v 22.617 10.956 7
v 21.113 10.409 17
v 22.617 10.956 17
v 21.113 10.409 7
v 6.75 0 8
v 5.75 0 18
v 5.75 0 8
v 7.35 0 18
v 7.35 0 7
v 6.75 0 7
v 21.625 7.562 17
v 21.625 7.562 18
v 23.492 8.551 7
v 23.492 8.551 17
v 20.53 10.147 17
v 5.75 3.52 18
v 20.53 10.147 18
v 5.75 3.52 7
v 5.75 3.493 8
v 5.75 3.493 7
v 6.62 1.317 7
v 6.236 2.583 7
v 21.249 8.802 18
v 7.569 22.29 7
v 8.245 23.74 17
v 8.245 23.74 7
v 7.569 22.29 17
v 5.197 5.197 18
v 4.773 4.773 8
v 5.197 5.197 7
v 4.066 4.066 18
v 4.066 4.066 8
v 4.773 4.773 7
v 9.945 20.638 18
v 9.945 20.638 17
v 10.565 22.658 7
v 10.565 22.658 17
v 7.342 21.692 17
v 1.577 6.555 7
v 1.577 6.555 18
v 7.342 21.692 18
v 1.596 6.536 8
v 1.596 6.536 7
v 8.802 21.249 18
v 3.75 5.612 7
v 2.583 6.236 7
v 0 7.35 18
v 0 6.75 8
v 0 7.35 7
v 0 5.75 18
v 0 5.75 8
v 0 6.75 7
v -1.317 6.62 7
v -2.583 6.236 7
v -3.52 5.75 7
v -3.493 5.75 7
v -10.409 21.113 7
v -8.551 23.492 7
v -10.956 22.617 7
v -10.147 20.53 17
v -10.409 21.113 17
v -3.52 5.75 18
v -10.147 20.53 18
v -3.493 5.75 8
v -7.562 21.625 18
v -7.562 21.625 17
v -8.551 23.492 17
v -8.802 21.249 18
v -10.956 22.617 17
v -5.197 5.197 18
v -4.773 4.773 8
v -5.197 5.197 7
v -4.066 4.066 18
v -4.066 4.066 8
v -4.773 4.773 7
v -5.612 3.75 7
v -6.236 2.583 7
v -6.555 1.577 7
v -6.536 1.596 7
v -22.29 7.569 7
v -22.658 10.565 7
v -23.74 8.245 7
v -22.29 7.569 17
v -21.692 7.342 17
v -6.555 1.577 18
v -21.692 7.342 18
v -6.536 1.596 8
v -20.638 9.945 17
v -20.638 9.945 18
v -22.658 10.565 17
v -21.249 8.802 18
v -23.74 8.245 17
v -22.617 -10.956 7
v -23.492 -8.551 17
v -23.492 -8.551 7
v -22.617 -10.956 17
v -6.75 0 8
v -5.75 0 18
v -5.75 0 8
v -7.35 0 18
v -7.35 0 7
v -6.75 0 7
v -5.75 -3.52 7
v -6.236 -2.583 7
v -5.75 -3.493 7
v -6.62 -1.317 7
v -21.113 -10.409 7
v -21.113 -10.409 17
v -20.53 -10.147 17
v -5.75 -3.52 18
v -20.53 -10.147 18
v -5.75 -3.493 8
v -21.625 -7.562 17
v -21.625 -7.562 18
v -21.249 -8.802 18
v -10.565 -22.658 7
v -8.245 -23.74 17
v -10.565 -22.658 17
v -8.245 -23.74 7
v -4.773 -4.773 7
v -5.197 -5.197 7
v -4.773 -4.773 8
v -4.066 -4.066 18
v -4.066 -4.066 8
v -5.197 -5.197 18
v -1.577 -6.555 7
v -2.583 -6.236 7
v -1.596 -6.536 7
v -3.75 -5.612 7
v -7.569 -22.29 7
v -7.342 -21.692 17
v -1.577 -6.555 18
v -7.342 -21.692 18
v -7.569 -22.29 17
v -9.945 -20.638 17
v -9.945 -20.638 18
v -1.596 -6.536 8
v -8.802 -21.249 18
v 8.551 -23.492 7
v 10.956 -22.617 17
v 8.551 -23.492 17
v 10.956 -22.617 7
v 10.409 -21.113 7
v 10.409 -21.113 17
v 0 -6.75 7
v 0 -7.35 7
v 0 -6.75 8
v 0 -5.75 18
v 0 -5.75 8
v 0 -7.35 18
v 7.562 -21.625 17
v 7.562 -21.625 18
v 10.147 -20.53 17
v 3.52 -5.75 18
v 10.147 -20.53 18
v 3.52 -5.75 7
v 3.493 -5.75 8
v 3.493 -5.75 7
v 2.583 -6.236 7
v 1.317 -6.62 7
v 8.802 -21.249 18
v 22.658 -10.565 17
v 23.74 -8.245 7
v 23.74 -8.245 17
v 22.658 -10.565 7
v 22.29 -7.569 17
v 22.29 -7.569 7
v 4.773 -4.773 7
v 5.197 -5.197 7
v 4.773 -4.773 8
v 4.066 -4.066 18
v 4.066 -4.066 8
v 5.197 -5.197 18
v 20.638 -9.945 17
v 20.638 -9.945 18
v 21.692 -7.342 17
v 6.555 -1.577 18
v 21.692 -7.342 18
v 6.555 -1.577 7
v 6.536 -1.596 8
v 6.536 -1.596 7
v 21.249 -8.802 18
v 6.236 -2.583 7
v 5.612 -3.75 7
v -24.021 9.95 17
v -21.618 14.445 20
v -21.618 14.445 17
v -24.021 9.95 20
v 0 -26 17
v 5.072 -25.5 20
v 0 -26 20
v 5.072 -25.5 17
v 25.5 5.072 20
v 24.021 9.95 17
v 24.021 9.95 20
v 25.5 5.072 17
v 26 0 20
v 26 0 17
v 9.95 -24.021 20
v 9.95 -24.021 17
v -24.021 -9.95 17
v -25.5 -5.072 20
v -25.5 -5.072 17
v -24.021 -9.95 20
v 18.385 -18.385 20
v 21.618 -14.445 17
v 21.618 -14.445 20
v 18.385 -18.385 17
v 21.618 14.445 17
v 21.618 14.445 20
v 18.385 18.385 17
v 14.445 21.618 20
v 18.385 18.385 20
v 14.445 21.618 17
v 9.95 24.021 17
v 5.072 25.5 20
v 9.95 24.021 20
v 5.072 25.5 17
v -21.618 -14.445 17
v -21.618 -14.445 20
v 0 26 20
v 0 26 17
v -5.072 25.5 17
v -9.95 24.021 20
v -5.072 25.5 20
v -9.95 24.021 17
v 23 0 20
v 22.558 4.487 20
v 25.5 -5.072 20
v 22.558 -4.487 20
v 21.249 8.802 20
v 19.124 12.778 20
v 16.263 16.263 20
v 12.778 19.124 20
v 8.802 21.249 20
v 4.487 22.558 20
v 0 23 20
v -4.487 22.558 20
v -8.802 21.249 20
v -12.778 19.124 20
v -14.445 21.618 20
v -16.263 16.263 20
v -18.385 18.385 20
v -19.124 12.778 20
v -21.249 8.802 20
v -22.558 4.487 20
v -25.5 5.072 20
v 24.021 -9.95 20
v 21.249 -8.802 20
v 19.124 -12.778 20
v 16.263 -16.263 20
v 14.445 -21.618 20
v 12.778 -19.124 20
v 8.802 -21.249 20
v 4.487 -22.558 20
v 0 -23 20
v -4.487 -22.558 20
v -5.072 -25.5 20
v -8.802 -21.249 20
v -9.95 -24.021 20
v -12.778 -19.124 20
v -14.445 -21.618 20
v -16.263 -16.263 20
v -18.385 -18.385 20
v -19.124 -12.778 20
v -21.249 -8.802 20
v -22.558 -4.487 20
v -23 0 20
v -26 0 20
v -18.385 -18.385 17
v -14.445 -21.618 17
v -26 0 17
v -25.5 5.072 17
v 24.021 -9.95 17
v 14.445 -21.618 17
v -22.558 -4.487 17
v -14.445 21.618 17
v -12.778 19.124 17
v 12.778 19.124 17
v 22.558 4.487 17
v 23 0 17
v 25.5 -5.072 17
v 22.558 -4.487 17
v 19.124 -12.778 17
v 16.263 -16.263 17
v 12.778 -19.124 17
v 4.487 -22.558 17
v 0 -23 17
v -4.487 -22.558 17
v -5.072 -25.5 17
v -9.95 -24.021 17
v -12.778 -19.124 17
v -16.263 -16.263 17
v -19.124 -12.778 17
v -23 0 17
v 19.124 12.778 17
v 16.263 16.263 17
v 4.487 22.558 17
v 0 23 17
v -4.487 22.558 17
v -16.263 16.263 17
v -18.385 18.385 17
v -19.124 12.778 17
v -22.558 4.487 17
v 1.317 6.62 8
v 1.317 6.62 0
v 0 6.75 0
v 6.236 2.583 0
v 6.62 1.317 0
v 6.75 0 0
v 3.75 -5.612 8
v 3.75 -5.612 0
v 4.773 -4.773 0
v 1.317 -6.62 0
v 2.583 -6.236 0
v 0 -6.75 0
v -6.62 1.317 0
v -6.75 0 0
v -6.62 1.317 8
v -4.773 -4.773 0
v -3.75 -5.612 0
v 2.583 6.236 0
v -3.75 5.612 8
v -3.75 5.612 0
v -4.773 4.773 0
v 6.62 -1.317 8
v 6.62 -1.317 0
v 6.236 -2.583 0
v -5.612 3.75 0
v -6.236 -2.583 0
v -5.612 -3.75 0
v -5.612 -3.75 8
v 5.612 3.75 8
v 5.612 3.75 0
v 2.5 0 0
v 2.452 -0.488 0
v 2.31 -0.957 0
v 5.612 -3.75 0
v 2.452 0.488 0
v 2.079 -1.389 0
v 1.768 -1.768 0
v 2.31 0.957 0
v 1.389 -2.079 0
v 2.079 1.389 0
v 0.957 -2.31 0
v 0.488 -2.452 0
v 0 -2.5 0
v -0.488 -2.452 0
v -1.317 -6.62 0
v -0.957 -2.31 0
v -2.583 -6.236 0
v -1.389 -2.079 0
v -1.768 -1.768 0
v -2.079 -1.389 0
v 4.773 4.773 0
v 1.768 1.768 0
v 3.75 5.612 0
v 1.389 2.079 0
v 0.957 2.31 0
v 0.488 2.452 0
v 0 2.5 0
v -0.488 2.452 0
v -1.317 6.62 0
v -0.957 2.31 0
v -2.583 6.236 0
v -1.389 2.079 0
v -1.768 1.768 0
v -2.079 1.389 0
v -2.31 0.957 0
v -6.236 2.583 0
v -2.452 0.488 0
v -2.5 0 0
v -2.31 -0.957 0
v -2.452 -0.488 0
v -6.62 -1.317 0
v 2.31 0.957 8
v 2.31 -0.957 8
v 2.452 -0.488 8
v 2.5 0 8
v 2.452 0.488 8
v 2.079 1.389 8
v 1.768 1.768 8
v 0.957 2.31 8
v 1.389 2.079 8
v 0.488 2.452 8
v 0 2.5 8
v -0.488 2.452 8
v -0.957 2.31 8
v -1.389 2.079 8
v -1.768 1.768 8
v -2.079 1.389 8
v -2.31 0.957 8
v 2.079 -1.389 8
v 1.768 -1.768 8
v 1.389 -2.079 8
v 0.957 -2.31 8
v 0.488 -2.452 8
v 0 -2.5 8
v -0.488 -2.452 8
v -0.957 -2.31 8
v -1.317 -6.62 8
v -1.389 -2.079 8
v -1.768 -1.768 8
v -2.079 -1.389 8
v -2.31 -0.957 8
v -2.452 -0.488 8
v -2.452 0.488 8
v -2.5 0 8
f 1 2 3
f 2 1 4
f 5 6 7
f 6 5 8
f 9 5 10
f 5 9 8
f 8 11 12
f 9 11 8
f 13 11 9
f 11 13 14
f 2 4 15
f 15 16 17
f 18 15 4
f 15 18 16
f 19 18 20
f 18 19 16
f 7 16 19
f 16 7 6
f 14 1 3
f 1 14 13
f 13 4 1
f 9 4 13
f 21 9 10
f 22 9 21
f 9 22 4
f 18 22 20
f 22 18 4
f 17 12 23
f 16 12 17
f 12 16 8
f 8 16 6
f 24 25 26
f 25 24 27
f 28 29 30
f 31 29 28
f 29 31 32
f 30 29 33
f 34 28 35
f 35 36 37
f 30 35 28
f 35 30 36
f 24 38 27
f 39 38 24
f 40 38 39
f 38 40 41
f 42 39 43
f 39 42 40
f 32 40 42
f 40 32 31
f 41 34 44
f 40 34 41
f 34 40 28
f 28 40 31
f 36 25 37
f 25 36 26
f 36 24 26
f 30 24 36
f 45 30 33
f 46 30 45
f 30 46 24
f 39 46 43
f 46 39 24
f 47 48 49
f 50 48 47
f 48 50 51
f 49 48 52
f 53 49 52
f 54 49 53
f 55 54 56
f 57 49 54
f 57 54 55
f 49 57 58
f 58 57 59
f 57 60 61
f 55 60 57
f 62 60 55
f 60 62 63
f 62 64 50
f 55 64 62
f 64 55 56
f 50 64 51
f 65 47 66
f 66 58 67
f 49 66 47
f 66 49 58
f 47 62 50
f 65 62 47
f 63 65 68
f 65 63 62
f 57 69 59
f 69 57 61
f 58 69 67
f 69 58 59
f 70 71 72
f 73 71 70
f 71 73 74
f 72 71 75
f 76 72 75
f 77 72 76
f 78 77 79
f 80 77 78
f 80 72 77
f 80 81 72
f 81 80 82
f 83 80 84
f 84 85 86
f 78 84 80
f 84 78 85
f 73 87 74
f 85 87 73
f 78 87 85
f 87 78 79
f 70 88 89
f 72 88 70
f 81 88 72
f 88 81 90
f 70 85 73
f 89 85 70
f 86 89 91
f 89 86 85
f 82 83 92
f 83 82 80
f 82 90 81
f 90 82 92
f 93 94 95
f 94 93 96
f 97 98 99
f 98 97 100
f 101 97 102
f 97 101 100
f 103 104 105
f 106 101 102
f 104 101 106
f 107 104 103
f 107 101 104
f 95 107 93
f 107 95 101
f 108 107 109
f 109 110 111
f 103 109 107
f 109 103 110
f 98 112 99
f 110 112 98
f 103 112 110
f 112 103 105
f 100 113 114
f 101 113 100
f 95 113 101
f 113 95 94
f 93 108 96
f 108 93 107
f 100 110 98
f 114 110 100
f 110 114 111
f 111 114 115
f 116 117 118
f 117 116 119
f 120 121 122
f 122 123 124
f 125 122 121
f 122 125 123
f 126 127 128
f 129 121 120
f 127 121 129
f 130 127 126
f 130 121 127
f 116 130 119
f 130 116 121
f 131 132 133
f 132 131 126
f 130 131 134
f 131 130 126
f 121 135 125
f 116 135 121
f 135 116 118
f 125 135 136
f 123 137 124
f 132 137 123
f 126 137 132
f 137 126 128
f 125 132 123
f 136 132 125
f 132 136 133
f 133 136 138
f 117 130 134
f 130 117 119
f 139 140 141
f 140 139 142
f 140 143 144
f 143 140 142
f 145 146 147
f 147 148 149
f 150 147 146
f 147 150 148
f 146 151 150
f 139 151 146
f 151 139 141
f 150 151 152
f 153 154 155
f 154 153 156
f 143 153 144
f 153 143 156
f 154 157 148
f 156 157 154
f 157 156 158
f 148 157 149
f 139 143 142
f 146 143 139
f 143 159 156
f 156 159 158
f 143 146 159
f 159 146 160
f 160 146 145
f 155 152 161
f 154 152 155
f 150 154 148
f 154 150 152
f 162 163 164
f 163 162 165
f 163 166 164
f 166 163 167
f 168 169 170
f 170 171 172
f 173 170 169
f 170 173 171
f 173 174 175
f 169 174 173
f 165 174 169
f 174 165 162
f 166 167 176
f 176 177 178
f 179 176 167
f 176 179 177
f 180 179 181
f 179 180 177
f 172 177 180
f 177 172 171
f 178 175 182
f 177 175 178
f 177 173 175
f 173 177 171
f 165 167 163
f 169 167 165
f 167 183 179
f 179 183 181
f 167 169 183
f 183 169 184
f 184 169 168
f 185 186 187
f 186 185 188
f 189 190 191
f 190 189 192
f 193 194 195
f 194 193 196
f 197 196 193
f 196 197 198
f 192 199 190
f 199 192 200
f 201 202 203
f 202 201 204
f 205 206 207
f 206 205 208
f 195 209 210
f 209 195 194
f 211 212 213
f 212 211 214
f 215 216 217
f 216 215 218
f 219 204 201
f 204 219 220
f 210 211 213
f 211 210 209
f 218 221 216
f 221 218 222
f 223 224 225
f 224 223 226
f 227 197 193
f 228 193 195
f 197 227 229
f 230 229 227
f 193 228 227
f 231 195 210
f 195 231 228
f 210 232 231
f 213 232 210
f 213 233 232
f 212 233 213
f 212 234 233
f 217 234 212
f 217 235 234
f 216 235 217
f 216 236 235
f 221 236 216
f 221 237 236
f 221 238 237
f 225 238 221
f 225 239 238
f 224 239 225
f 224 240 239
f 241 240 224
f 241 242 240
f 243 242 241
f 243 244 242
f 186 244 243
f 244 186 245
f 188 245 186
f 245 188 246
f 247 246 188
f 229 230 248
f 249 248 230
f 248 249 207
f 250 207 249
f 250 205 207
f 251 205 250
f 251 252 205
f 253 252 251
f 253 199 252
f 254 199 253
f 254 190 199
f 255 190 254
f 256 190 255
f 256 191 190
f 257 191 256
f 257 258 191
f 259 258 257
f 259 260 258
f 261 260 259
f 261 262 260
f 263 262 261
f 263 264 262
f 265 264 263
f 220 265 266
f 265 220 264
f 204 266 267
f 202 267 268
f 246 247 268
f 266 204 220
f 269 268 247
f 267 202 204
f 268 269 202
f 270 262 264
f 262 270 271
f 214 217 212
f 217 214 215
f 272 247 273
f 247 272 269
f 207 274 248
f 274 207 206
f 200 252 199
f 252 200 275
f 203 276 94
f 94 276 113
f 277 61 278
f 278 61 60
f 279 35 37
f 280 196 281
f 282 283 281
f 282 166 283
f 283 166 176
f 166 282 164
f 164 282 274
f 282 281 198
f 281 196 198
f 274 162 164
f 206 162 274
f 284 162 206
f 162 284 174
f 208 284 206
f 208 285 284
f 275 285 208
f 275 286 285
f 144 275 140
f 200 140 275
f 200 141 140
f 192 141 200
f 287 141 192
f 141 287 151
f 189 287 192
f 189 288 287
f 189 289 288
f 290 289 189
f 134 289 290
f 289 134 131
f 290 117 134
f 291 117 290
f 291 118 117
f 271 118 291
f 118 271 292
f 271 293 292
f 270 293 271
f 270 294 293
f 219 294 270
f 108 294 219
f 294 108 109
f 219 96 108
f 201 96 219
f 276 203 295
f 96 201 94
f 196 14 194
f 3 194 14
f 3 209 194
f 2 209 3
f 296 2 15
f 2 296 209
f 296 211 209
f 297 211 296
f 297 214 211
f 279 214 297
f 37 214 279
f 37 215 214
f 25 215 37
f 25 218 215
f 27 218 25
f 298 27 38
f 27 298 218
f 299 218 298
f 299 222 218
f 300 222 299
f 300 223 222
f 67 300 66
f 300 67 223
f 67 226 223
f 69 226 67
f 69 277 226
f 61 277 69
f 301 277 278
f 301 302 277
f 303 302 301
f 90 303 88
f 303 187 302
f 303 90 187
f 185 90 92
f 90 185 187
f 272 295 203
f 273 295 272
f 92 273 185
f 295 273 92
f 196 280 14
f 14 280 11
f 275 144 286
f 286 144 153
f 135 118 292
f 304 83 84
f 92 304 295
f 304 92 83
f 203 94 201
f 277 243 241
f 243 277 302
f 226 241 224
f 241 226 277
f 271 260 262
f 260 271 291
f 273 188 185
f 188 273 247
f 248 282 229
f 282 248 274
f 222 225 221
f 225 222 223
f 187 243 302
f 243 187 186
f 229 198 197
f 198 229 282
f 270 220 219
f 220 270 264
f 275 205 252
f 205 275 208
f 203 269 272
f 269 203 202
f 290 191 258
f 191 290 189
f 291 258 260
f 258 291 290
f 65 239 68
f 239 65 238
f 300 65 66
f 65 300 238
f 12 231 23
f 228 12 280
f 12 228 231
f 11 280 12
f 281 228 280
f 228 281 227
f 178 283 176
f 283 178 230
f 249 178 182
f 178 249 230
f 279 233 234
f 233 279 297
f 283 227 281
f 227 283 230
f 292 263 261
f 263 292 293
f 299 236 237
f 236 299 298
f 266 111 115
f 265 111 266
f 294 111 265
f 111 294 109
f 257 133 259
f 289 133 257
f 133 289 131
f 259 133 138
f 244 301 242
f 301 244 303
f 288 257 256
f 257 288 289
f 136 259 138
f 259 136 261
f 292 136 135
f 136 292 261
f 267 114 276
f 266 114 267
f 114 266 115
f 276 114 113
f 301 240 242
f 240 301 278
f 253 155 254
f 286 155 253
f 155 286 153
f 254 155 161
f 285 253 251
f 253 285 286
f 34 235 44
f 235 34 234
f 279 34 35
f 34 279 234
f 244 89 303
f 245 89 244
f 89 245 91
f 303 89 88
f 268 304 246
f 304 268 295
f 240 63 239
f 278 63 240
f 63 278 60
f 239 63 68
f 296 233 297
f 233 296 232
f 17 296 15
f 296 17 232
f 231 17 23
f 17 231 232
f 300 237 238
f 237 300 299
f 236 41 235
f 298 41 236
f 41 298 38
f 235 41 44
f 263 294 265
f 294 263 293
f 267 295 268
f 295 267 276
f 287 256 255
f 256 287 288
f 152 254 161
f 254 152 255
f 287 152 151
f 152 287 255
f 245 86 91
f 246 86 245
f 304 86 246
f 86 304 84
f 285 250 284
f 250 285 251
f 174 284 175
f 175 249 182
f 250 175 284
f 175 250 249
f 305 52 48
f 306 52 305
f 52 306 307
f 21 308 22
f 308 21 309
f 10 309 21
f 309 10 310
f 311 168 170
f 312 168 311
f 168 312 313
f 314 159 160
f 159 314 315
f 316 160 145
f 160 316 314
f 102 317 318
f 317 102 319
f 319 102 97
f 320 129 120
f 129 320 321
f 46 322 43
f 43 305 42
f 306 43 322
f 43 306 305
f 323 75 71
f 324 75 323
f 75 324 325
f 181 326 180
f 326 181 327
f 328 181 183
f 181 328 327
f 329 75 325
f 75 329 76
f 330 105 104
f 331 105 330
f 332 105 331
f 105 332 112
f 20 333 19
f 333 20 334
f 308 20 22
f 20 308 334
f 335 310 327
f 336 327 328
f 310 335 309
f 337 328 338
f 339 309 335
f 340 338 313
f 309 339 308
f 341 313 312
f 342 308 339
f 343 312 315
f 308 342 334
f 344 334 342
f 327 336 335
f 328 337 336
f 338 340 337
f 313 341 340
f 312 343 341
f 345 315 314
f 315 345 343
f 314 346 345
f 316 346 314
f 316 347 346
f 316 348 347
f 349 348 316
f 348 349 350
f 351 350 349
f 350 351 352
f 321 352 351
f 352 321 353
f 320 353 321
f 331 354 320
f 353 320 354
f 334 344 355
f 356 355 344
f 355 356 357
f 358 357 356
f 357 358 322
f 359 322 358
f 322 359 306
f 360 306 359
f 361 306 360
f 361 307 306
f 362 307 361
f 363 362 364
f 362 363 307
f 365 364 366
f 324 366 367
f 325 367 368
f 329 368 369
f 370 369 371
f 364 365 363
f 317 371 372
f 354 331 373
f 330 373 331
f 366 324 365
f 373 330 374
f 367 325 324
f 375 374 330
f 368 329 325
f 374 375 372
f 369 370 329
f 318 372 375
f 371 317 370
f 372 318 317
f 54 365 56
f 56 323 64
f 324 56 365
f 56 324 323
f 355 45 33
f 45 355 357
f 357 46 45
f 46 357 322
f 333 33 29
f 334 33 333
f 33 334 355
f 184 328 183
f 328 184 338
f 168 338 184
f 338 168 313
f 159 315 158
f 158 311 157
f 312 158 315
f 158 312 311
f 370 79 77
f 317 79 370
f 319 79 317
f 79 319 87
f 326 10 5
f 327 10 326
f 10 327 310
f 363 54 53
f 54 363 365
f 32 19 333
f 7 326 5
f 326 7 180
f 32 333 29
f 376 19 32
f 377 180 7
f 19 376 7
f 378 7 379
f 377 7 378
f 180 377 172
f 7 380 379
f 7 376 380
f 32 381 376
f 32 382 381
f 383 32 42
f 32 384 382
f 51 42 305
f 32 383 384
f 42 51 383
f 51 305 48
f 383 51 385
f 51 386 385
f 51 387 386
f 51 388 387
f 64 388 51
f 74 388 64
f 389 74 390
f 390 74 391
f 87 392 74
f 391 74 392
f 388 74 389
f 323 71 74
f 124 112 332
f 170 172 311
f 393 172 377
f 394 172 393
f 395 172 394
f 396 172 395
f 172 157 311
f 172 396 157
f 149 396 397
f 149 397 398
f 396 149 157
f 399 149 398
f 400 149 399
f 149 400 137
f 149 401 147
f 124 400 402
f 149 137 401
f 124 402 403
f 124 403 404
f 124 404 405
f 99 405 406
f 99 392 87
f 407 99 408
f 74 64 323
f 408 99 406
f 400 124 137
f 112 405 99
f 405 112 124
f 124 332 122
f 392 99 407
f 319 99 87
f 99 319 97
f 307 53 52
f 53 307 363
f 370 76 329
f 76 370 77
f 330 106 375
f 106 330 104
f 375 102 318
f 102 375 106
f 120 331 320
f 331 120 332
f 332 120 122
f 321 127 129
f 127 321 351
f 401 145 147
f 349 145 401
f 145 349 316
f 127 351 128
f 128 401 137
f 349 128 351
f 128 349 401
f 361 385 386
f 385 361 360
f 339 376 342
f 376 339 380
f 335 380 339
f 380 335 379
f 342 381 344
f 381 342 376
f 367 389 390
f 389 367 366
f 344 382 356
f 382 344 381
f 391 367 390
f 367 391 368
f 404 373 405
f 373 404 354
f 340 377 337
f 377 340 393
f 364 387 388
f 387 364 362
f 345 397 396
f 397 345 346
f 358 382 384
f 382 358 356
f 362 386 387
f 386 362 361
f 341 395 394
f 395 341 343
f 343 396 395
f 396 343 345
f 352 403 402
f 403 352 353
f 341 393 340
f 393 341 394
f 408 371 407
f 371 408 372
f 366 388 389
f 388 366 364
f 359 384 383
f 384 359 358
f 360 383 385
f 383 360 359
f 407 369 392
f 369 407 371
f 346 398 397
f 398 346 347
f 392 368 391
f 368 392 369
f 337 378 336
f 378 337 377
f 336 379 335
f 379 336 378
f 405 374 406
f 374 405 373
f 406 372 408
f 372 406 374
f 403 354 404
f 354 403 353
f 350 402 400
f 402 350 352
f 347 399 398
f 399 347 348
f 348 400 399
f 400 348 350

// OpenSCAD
$fn = 32;

// ----------------------------------------------------------------------
// Impeller: 50 mm, 8 blades, 20 mm tall
// ----------------------------------------------------------------------

// --- parameters (mm) ---
center_d = 13.5;          // hub diameter
center_h = 8;             // hub height
wheel_d = 50;             // outer diameter over the blades
blade_count = 8;          // number of blades
blade_t = 1.6;            // blade thickness
blade_h = 10;             // blade height
blade_in_r = 5.75;        // blade root radius
blade_out_r = 23.4;       // blade tip radius
sweep = 20;               // blade sweep, degrees
bore_d = 5;               // shaft bore
shroud_h = 2;             // shroud ring thickness
shroud_d = 52;            // shroud outside diameter

module hub() {
  cylinder(h = center_h, d = center_d);
}

module blade() {
  /* blade swept between two boxes: hull of the root and the tip section */
  hull() {
    translate([blade_in_r, 0, center_h - 1])
      cube([blade_t, blade_t * 2.2, blade_h + 1], center = false);
    rotate([0, 0, sweep])
      translate([blade_out_r, 0, center_h - 1])
        cube([blade_t, blade_t * 1.6, blade_h + 1], center = false);
  }
}

module blades() {
  for (i = [0 : blade_count - 1])
    rotate([0, 0, i * 360 / blade_count]) blade();
}

module shroud() {
  translate([0, 0, center_h + blade_h - 1])
    difference() {
      cylinder(h = shroud_h + 1, d = shroud_d);
      translate([0, 0, -1]) cylinder(h = shroud_h + 3, d = shroud_d - 2 * 3);
    }
}

difference() {
  union() {
    hub();
    blades();
    shroud();
  }
  translate([0, 0, -1]) cylinder(h = center_h + blade_h + shroud_h + 3, d = bore_d);
}
